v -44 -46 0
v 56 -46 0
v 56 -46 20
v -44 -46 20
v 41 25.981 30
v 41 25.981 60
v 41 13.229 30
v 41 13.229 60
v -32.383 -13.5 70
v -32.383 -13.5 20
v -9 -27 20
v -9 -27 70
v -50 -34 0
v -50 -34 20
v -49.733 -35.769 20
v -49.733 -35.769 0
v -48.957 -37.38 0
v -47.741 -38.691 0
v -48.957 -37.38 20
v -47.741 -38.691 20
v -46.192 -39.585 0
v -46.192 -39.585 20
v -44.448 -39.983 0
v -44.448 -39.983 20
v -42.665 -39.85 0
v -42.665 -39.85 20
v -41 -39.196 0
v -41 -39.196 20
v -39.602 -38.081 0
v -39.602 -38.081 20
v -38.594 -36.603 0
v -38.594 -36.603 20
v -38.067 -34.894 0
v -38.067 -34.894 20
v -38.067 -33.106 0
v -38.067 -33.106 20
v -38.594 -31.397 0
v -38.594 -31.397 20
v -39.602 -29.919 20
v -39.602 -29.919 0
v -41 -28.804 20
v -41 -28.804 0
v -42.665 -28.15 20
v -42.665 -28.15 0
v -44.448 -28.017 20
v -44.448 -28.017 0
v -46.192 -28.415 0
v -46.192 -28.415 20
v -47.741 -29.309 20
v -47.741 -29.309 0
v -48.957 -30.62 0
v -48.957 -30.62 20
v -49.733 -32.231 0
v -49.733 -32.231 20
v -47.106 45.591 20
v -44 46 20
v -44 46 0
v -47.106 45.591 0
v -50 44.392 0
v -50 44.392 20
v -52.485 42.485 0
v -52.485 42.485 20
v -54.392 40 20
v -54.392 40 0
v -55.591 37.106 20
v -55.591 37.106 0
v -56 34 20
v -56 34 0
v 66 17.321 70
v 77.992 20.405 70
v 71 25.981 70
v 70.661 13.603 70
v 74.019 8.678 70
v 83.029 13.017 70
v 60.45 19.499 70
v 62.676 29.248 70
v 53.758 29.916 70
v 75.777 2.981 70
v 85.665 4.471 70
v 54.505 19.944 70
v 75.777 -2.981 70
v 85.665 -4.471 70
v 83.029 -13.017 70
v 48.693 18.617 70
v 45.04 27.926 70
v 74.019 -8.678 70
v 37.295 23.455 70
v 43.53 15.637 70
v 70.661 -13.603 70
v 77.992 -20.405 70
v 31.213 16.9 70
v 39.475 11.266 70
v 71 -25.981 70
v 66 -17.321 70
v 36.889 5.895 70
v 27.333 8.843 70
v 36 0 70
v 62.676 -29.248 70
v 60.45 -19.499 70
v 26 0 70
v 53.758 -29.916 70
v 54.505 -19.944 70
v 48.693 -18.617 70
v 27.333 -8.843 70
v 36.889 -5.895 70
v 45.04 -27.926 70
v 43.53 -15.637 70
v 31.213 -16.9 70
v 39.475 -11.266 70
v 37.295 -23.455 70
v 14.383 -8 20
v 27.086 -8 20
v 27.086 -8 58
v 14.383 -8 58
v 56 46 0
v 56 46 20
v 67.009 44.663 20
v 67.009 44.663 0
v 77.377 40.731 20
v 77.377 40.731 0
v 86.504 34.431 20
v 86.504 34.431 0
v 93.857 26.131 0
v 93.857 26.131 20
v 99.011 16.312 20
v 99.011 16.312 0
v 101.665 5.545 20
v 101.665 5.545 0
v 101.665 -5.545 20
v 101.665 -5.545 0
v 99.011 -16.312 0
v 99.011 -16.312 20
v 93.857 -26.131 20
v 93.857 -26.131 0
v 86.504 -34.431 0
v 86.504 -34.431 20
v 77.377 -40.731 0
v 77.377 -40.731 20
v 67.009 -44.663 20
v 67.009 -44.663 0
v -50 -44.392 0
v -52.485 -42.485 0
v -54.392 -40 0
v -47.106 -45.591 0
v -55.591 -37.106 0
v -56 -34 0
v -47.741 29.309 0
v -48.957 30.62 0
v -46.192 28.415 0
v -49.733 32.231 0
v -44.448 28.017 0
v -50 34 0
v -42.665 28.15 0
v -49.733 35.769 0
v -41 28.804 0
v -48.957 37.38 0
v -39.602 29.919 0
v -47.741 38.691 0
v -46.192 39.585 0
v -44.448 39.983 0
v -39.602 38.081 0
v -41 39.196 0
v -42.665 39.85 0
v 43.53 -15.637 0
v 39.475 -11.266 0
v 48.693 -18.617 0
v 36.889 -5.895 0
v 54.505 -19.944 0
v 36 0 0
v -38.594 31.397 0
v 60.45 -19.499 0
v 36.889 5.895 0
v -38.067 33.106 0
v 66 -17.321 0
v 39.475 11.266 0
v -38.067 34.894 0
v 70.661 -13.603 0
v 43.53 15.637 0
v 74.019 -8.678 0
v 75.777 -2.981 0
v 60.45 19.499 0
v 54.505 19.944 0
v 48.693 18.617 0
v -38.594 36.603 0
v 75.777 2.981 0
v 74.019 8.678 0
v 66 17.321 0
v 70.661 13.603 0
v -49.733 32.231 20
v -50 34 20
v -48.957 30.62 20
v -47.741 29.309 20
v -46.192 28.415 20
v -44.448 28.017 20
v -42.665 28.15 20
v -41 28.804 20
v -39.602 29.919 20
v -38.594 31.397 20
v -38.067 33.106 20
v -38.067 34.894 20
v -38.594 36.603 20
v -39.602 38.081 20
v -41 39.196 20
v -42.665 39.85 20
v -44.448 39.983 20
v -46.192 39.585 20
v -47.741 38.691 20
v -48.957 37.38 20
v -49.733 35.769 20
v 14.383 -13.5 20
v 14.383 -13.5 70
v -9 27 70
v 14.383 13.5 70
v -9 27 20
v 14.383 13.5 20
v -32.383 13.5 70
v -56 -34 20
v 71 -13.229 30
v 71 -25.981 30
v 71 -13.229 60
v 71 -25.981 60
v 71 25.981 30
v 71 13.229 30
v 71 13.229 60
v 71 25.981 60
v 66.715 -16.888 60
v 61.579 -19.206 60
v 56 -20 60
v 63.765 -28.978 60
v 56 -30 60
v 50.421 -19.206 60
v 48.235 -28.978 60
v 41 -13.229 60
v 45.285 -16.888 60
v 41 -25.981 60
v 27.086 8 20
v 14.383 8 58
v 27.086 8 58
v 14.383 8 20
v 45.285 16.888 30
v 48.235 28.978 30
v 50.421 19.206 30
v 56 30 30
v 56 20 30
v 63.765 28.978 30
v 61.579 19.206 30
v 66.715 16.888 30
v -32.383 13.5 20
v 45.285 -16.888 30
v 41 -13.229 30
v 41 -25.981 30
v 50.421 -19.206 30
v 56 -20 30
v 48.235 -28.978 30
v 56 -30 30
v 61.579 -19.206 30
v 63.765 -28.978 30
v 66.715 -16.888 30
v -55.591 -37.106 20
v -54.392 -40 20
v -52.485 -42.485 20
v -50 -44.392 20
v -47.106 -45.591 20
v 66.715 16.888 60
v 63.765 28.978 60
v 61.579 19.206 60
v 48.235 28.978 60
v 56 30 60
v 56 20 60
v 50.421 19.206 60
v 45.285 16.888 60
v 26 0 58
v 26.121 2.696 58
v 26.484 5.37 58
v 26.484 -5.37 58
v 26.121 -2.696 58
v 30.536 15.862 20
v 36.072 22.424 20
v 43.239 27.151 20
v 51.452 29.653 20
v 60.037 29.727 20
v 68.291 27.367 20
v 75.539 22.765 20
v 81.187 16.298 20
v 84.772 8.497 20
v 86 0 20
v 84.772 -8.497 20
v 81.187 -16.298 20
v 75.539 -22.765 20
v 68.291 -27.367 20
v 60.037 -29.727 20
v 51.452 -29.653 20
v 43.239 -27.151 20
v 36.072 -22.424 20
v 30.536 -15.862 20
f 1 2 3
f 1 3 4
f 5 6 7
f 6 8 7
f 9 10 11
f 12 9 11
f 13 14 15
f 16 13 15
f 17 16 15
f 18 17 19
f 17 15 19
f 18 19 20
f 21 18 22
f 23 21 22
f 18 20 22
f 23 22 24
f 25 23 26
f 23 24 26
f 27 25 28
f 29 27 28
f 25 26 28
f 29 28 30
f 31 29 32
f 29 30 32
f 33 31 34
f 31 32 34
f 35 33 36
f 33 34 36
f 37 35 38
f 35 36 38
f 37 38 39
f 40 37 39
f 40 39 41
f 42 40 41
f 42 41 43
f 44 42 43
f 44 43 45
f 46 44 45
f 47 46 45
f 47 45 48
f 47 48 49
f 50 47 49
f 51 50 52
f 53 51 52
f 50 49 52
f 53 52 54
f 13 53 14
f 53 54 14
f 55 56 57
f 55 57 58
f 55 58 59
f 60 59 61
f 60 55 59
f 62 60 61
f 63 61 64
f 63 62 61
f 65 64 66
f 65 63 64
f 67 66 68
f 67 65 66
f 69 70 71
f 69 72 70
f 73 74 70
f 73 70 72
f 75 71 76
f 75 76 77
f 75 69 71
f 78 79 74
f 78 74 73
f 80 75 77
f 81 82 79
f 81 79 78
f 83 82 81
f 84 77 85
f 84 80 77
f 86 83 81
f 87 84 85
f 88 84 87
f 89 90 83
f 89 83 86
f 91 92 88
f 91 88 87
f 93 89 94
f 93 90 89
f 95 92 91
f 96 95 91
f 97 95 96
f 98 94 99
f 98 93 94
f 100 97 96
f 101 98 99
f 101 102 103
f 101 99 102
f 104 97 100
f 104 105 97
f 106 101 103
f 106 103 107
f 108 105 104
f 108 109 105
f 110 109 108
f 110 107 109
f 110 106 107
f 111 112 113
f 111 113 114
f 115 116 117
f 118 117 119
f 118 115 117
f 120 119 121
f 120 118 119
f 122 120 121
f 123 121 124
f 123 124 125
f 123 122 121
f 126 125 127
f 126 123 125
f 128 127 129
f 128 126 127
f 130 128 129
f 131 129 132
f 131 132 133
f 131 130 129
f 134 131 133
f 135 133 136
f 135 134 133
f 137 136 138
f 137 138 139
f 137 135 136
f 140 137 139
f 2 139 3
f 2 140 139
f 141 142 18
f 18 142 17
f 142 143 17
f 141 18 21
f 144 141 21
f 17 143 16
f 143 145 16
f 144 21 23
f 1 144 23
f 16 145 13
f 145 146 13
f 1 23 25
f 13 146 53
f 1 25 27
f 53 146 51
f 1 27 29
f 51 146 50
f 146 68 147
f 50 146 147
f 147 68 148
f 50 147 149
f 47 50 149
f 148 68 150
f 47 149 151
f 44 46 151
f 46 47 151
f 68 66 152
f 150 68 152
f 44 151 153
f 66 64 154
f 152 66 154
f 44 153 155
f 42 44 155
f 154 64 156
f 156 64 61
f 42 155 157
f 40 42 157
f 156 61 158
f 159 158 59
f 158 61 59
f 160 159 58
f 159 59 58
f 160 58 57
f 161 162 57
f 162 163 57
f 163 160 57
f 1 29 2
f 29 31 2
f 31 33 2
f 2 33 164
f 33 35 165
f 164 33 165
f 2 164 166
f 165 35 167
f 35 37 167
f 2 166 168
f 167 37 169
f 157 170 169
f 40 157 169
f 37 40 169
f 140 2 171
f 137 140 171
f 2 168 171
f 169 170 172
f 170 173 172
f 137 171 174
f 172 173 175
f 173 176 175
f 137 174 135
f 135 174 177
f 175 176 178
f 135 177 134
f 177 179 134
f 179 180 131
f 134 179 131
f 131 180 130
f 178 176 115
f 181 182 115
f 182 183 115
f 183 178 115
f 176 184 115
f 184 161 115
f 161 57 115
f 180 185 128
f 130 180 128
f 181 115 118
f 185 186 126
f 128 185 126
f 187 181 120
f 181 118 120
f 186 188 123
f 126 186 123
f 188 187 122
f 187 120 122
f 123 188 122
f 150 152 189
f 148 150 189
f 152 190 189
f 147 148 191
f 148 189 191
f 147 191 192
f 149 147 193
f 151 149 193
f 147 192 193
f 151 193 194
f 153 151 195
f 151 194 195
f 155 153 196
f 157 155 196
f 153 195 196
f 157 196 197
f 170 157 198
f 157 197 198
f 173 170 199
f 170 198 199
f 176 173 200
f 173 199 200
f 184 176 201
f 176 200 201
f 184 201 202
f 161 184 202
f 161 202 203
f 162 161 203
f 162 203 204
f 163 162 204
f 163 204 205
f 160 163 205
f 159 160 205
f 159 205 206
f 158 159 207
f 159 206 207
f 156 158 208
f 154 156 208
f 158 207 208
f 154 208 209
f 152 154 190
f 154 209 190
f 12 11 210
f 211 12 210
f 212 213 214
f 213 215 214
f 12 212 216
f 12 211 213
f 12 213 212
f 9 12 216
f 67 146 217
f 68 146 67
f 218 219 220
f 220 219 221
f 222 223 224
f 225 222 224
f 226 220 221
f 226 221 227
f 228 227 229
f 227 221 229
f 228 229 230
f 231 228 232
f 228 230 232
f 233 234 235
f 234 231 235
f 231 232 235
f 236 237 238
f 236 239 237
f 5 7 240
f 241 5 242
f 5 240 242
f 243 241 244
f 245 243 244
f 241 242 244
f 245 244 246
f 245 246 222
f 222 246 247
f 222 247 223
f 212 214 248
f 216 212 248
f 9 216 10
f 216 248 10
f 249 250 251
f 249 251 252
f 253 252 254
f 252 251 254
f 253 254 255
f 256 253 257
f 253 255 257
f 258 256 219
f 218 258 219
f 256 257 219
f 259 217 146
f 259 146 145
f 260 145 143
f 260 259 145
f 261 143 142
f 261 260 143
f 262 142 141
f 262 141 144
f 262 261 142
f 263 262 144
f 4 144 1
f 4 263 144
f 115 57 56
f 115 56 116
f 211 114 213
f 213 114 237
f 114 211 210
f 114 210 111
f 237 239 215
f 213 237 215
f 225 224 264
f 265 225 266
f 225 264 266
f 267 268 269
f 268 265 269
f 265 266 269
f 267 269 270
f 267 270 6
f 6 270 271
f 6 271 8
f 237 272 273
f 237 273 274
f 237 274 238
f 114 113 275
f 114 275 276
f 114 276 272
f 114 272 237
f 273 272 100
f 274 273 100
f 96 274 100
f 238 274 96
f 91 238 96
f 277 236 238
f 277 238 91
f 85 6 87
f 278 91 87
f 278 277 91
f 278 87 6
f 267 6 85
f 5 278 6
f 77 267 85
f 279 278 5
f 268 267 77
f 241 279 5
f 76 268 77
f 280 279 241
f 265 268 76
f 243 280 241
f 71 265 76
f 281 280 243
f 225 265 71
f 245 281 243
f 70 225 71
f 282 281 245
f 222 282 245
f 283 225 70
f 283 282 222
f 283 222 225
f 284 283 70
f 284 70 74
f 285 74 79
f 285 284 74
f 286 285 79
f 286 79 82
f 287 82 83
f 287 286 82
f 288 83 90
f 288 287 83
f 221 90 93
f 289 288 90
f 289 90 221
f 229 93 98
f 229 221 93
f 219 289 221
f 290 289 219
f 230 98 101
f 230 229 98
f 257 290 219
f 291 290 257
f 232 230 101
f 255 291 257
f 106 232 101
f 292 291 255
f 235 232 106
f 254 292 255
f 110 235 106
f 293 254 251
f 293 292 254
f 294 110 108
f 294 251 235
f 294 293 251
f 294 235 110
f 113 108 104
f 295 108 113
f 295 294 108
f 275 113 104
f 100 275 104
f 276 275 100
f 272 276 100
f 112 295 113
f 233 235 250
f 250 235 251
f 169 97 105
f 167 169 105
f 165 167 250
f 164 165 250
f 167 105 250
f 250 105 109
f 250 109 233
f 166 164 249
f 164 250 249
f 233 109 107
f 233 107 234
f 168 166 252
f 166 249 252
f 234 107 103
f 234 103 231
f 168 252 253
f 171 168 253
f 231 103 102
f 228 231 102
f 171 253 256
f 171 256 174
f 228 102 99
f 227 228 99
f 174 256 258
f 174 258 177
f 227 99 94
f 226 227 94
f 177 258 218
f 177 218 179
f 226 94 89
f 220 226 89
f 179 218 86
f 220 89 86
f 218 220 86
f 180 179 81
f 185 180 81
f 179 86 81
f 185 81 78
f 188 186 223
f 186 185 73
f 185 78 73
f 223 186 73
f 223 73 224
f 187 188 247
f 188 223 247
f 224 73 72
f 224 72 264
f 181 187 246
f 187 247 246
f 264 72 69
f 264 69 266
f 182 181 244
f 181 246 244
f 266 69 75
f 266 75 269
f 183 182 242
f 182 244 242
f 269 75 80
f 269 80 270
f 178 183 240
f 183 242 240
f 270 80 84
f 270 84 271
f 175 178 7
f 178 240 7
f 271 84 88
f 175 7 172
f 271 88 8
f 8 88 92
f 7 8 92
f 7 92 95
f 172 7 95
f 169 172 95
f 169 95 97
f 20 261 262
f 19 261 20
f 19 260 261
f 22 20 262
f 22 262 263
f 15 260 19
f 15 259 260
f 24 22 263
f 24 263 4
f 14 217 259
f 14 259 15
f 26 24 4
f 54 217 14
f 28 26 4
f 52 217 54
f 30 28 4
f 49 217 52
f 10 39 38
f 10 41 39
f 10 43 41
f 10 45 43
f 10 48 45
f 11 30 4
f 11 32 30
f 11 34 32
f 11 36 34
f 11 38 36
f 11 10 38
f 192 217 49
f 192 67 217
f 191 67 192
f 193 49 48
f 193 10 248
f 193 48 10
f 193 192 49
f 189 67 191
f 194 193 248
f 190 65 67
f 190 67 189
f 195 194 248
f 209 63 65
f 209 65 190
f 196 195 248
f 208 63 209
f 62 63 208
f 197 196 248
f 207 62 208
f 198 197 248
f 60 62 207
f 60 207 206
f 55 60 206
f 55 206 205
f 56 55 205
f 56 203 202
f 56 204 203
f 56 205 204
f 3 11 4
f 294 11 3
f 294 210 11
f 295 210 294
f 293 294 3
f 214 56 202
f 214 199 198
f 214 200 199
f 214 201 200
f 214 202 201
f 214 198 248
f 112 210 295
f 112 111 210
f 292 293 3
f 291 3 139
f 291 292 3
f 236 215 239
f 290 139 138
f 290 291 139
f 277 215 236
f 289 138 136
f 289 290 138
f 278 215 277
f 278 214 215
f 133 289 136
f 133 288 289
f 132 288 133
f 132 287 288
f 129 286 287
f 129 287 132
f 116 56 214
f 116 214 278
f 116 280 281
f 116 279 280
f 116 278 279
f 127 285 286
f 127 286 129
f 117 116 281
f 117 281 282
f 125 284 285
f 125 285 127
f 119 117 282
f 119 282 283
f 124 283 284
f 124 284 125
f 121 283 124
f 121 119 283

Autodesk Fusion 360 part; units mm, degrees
sketch "Sketch1" plane through (0, 0, 0) normal (0, 0, 1) x (1, 0, 0)
  line L0 (-56, 46) -> (56, 46)
  line L1 (56, 46) -> (56, -46)
  line L2 (56, -46) -> (-56, -46)
  line L3 (-56, -46) -> (-56, 46)
  line L4 (-56, 46) -> (56, -46) construction
  line L5 (56, 46) -> (-56, -46) construction
  dimension "d1" = 92
  dimension "d2" = 112
extrude "Extrude1" add sketch "Sketch1" along normal blind 20
sketch "Sketch2" plane through (0, 0, 0) normal (0, 0, -1) x (1, 0, 0)
  line L0 (56, 46) -> (-56, 46)
  line L1 (-56, 46) -> (-56, -46)
  line L2 (-56, -46) -> (56, -46)
  line L3 (56, -46) -> (56, 46)
  circle A0 centre (56, 0) radius 46
  dimension "d5" = 92
extrude "Extrude2" add sketch "Sketch2" against normal blind 20 contours L3 A0 picked at (67.5882, 10.0412)
sketch "Sketch3" plane through (0, 0, 20) normal (0, 0, 1) x (-1, 0, 0)
  line L0 (56, 46) -> (-56, 46)
  arc A0 (-56, 46) -> (-56, -46) centre (-56, 0) ccw
  line L1 (-56, -46) -> (56, -46)
  line L2 (56, -46) -> (56, 46)
  circle A1 centre (-56, 0) radius 30
  dimension "d8" = 60
extrude "Extrude3" add sketch "Sketch3" along normal blind 50 contours A1
ref_plane "WorkPlane1" through (56, -30, 48.1933) normal (0, -1, 0) x (-1, 0, 0)
sketch "Sketch4" plane through (56, -30, 48.1933) normal (0, -1, 0) x (1, 0, 0)
  line L0 (30, 21.8067) -> (-30, 21.8067)
  line L1 (0, -48.1933) -> (46, -48.1933)
  line L2 (46, -28.1933) -> (30, -28.1933)
  line L3 (-112, -48.1933) -> (-112, -28.1933)
  line L4 (-112, -48.1933) -> (0, -48.1933)
  line L5 (-30, -28.1933) -> (-112, -28.1933)
  line L6 (30, -28.1933) -> (30, 21.8067)
  line L7 (-30, -28.1933) -> (-30, 21.8067)
  line L8 (46, -48.1933) -> (46, -28.1933)
  line L9 (0, 21.8067) -> (0, 11.8067) construction
  line L10 (0, 11.8067) -> (0, -3.1933) construction
  line L11 (15, 11.8067) -> (-15, 11.8067)
  line L12 (-15, 11.8067) -> (-15, -18.1933)
  line L13 (-15, -18.1933) -> (15, -18.1933)
  line L14 (15, -18.1933) -> (15, 11.8067)
  line L15 (15, 11.8067) -> (-15, -18.1933) construction
  line L16 (-15, 11.8067) -> (15, -18.1933) construction
  point P0 (0, -3.1933)
  dimension "d12" = 10
  dimension "d13" = 15
  dimension "d14" = 30
  dimension "d15" = 30
extrude "Extrude4" cut sketch "Sketch4" against normal blind 100 contours L11 L12 L13 L14
sketch "Sketch5" plane through (0, 0, 70) normal (0, 0, 1) x (-1, 0, 0)
  circle A0 centre (-56, 0) radius 30
  circle A1 centre (-56, 0) radius 20
  dimension "d18" = 40
extrude "Extrude5" cut sketch "Sketch5" against normal blind 120 contours A1
sketch "Sketch6" plane through (0, 0, 20) normal (0, 0, 1) x (-1, 0, 0)
  circle A0 centre (-56, 0) radius 30
  line L0 (56, 46) -> (-56, 46)
  arc A1 (-56, 46) -> (-56, -46) centre (-56, 0) ccw
  line L1 (-56, -46) -> (56, -46)
  line L2 (56, -46) -> (56, 46)
  line L3 (56, -46) -> (56, -34) construction
  line L4 (56, -34) -> (44, -34) construction
  circle A2 centre (44, -34) radius 12
  line L5 (56, 46) -> (56, 34) construction
  line L6 (56, 34) -> (44, 34) construction
  circle A3 centre (44, 34) radius 12
  circle A4 centre (44, 34) radius 6
  circle A5 centre (44, -34) radius 6
  dimension "d21" = 12
  dimension "d22" = 12
  dimension "d23" = 24
  dimension "d24" = 12
  dimension "d25" = 12
  dimension "d26" = 24
  dimension "d27" = 12
  dimension "d28" = 12
extrude "Extrude6" cut sketch "Sketch6" against normal blind 30 contours A4 | A5
sketch "Sketch7" plane through (0, 0, 20) normal (0, 0, 1) x (-1, 0, 0)
  circle A0 centre (44, -34) radius 6
  circle A1 centre (44, 34) radius 6
  circle A2 centre (-56, 0) radius 30
  line L0 (56, 46) -> (-56, 46)
  arc A3 (-56, 46) -> (-56, -46) centre (-56, 0) ccw
  line L1 (-56, -46) -> (56, -46)
  line L2 (56, -46) -> (56, 46)
  circle A4 centre (44, -34) radius 12
  circle A5 centre (44, 34) radius 12
  dimension "d31" = 24
  dimension "d32" = 24
extrude "Extrude7" cut sketch "Sketch7" against normal blind 40 contours L0 L2 A5 | L1 L2 A4
sketch "Sketch8" plane through (0, 0, 20) normal (0, 0, 1) x (-1, 0, 0)
  arc A0 (56, 34) -> (44, 46) centre (44, 34) ccw
  line L0 (44, 46) -> (-56, 46)
  arc A1 (-56, 46) -> (-56, -46) centre (-56, 0) ccw
  line L1 (-56, -46) -> (44, -46)
  arc A2 (44, -46) -> (56, -34) centre (44, -34) ccw
  line L2 (56, -34) -> (56, 34)
  circle A3 centre (44, -34) radius 6
  circle A4 centre (44, 34) radius 6
  circle A5 centre (-56, 0) radius 30
  line L3 (44, -34) -> (9, -34) construction
  line L4 (9, 34) -> (9, 0) construction
  line L5 (9, -27) -> (32.3827, -13.5)
  line L6 (32.3827, -13.5) -> (32.3827, 13.5)
  line L7 (32.3827, 13.5) -> (9, 27)
  line L8 (9, 27) -> (-14.3827, 13.5)
  line L9 (-14.3827, 13.5) -> (-14.3827, -13.5)
  line L10 (-14.3827, -13.5) -> (9, -27)
  line L11 (9, -34) -> (9, -27)
  arc A6 (-14.3827, -11.3688) -> (-12.537, -14.5656) centre (9, 0) ccw construction
  arc A7 (-12.537, 14.5656) -> (-14.3827, 11.3688) centre (9, 0) ccw construction
  arc A8 (10.8457, 25.9344) -> (7.1543, 25.9344) centre (9, 0) ccw construction
  arc A9 (10.8457, -25.9344) -> (32.3827, -11.3688) centre (9, 0) ccw construction
  arc A10 (32.3827, 11.3688) -> (30.537, 14.5656) centre (9, 0) ccw construction
  point P0 (9, 0)
  dimension "d35" = 35
  dimension "d36" = 52
extrude "Extrude8" add sketch "Sketch8" along normal blind 50 contours L5 L6 L7 L8 L9 L10
sketch "Sketch9" plane through (0, 0, 20) normal (0, 0, 1) x (-1, 0, 0)
  line L0 (-14.3827, -13.5) -> (-14.3827, 13.5)
  line L1 (-14.3827, 13.5) -> (9, 27)
  line L2 (9, 27) -> (32.3827, 13.5)
  line L3 (32.3827, 13.5) -> (32.3827, -13.5)
  line L4 (32.3827, -13.5) -> (9, -27)
  line L5 (9, -27) -> (-14.3827, -13.5)
  arc A0 (56, 34) -> (44, 46) centre (44, 34) ccw
  line L6 (44, 46) -> (-56, 46)
  arc A1 (-56, 46) -> (-56, -46) centre (-56, 0) ccw
  line L7 (-56, -46) -> (44, -46)
  arc A2 (44, -46) -> (56, -34) centre (44, -34) ccw
  line L8 (56, -34) -> (56, 34)
  circle A3 centre (44, -34) radius 6
  circle A4 centre (44, 34) radius 6
  circle A5 centre (-56, 0) radius 30
  line L9 (-14.3827, -13.5) -> (9, -27)
  line L10 (9, -27) -> (32.3827, -13.5)
  line L11 (32.3827, -13.5) -> (32.3827, 13.5)
  line L12 (32.3827, 13.5) -> (9, 27)
  line L13 (9, 27) -> (-14.3827, 13.5)
  line L14 (-14.3827, 13.5) -> (-14.3827, -13.5)
  circle A6 centre (-56, 0) radius 20
  circle A7 centre (-56, 0) radius 30
  line L15 (-10, 0) -> (-29.7237, 0) construction
  line L16 (-10, 0) -> (-10, -8) construction
  line L17 (-10, -8) -> (-32.4254, -8)
  line L18 (-32.4254, -8) -> (-32.4254, 8)
  line L19 (-32.4254, 8) -> (-10, 8)
  line L20 (-10, 8) -> (-10, -8)
  dimension "d39" = 8
  dimension "d40" = 16
extrude "Extrude9" add sketch "Sketch9" along normal blind 38 contours L0 A5 L14 A7 L17 L19 | L0 L14 L17 L19 L20 | A5 A7 L17 L18 L19 picked at (-30.2836, 0)
equation "d1 = 68 mm + 12 mm + 12 mm"
equation "d5 = 46 mm + 46 mm"
equation "d41 = 50 mm - 12 mm"
